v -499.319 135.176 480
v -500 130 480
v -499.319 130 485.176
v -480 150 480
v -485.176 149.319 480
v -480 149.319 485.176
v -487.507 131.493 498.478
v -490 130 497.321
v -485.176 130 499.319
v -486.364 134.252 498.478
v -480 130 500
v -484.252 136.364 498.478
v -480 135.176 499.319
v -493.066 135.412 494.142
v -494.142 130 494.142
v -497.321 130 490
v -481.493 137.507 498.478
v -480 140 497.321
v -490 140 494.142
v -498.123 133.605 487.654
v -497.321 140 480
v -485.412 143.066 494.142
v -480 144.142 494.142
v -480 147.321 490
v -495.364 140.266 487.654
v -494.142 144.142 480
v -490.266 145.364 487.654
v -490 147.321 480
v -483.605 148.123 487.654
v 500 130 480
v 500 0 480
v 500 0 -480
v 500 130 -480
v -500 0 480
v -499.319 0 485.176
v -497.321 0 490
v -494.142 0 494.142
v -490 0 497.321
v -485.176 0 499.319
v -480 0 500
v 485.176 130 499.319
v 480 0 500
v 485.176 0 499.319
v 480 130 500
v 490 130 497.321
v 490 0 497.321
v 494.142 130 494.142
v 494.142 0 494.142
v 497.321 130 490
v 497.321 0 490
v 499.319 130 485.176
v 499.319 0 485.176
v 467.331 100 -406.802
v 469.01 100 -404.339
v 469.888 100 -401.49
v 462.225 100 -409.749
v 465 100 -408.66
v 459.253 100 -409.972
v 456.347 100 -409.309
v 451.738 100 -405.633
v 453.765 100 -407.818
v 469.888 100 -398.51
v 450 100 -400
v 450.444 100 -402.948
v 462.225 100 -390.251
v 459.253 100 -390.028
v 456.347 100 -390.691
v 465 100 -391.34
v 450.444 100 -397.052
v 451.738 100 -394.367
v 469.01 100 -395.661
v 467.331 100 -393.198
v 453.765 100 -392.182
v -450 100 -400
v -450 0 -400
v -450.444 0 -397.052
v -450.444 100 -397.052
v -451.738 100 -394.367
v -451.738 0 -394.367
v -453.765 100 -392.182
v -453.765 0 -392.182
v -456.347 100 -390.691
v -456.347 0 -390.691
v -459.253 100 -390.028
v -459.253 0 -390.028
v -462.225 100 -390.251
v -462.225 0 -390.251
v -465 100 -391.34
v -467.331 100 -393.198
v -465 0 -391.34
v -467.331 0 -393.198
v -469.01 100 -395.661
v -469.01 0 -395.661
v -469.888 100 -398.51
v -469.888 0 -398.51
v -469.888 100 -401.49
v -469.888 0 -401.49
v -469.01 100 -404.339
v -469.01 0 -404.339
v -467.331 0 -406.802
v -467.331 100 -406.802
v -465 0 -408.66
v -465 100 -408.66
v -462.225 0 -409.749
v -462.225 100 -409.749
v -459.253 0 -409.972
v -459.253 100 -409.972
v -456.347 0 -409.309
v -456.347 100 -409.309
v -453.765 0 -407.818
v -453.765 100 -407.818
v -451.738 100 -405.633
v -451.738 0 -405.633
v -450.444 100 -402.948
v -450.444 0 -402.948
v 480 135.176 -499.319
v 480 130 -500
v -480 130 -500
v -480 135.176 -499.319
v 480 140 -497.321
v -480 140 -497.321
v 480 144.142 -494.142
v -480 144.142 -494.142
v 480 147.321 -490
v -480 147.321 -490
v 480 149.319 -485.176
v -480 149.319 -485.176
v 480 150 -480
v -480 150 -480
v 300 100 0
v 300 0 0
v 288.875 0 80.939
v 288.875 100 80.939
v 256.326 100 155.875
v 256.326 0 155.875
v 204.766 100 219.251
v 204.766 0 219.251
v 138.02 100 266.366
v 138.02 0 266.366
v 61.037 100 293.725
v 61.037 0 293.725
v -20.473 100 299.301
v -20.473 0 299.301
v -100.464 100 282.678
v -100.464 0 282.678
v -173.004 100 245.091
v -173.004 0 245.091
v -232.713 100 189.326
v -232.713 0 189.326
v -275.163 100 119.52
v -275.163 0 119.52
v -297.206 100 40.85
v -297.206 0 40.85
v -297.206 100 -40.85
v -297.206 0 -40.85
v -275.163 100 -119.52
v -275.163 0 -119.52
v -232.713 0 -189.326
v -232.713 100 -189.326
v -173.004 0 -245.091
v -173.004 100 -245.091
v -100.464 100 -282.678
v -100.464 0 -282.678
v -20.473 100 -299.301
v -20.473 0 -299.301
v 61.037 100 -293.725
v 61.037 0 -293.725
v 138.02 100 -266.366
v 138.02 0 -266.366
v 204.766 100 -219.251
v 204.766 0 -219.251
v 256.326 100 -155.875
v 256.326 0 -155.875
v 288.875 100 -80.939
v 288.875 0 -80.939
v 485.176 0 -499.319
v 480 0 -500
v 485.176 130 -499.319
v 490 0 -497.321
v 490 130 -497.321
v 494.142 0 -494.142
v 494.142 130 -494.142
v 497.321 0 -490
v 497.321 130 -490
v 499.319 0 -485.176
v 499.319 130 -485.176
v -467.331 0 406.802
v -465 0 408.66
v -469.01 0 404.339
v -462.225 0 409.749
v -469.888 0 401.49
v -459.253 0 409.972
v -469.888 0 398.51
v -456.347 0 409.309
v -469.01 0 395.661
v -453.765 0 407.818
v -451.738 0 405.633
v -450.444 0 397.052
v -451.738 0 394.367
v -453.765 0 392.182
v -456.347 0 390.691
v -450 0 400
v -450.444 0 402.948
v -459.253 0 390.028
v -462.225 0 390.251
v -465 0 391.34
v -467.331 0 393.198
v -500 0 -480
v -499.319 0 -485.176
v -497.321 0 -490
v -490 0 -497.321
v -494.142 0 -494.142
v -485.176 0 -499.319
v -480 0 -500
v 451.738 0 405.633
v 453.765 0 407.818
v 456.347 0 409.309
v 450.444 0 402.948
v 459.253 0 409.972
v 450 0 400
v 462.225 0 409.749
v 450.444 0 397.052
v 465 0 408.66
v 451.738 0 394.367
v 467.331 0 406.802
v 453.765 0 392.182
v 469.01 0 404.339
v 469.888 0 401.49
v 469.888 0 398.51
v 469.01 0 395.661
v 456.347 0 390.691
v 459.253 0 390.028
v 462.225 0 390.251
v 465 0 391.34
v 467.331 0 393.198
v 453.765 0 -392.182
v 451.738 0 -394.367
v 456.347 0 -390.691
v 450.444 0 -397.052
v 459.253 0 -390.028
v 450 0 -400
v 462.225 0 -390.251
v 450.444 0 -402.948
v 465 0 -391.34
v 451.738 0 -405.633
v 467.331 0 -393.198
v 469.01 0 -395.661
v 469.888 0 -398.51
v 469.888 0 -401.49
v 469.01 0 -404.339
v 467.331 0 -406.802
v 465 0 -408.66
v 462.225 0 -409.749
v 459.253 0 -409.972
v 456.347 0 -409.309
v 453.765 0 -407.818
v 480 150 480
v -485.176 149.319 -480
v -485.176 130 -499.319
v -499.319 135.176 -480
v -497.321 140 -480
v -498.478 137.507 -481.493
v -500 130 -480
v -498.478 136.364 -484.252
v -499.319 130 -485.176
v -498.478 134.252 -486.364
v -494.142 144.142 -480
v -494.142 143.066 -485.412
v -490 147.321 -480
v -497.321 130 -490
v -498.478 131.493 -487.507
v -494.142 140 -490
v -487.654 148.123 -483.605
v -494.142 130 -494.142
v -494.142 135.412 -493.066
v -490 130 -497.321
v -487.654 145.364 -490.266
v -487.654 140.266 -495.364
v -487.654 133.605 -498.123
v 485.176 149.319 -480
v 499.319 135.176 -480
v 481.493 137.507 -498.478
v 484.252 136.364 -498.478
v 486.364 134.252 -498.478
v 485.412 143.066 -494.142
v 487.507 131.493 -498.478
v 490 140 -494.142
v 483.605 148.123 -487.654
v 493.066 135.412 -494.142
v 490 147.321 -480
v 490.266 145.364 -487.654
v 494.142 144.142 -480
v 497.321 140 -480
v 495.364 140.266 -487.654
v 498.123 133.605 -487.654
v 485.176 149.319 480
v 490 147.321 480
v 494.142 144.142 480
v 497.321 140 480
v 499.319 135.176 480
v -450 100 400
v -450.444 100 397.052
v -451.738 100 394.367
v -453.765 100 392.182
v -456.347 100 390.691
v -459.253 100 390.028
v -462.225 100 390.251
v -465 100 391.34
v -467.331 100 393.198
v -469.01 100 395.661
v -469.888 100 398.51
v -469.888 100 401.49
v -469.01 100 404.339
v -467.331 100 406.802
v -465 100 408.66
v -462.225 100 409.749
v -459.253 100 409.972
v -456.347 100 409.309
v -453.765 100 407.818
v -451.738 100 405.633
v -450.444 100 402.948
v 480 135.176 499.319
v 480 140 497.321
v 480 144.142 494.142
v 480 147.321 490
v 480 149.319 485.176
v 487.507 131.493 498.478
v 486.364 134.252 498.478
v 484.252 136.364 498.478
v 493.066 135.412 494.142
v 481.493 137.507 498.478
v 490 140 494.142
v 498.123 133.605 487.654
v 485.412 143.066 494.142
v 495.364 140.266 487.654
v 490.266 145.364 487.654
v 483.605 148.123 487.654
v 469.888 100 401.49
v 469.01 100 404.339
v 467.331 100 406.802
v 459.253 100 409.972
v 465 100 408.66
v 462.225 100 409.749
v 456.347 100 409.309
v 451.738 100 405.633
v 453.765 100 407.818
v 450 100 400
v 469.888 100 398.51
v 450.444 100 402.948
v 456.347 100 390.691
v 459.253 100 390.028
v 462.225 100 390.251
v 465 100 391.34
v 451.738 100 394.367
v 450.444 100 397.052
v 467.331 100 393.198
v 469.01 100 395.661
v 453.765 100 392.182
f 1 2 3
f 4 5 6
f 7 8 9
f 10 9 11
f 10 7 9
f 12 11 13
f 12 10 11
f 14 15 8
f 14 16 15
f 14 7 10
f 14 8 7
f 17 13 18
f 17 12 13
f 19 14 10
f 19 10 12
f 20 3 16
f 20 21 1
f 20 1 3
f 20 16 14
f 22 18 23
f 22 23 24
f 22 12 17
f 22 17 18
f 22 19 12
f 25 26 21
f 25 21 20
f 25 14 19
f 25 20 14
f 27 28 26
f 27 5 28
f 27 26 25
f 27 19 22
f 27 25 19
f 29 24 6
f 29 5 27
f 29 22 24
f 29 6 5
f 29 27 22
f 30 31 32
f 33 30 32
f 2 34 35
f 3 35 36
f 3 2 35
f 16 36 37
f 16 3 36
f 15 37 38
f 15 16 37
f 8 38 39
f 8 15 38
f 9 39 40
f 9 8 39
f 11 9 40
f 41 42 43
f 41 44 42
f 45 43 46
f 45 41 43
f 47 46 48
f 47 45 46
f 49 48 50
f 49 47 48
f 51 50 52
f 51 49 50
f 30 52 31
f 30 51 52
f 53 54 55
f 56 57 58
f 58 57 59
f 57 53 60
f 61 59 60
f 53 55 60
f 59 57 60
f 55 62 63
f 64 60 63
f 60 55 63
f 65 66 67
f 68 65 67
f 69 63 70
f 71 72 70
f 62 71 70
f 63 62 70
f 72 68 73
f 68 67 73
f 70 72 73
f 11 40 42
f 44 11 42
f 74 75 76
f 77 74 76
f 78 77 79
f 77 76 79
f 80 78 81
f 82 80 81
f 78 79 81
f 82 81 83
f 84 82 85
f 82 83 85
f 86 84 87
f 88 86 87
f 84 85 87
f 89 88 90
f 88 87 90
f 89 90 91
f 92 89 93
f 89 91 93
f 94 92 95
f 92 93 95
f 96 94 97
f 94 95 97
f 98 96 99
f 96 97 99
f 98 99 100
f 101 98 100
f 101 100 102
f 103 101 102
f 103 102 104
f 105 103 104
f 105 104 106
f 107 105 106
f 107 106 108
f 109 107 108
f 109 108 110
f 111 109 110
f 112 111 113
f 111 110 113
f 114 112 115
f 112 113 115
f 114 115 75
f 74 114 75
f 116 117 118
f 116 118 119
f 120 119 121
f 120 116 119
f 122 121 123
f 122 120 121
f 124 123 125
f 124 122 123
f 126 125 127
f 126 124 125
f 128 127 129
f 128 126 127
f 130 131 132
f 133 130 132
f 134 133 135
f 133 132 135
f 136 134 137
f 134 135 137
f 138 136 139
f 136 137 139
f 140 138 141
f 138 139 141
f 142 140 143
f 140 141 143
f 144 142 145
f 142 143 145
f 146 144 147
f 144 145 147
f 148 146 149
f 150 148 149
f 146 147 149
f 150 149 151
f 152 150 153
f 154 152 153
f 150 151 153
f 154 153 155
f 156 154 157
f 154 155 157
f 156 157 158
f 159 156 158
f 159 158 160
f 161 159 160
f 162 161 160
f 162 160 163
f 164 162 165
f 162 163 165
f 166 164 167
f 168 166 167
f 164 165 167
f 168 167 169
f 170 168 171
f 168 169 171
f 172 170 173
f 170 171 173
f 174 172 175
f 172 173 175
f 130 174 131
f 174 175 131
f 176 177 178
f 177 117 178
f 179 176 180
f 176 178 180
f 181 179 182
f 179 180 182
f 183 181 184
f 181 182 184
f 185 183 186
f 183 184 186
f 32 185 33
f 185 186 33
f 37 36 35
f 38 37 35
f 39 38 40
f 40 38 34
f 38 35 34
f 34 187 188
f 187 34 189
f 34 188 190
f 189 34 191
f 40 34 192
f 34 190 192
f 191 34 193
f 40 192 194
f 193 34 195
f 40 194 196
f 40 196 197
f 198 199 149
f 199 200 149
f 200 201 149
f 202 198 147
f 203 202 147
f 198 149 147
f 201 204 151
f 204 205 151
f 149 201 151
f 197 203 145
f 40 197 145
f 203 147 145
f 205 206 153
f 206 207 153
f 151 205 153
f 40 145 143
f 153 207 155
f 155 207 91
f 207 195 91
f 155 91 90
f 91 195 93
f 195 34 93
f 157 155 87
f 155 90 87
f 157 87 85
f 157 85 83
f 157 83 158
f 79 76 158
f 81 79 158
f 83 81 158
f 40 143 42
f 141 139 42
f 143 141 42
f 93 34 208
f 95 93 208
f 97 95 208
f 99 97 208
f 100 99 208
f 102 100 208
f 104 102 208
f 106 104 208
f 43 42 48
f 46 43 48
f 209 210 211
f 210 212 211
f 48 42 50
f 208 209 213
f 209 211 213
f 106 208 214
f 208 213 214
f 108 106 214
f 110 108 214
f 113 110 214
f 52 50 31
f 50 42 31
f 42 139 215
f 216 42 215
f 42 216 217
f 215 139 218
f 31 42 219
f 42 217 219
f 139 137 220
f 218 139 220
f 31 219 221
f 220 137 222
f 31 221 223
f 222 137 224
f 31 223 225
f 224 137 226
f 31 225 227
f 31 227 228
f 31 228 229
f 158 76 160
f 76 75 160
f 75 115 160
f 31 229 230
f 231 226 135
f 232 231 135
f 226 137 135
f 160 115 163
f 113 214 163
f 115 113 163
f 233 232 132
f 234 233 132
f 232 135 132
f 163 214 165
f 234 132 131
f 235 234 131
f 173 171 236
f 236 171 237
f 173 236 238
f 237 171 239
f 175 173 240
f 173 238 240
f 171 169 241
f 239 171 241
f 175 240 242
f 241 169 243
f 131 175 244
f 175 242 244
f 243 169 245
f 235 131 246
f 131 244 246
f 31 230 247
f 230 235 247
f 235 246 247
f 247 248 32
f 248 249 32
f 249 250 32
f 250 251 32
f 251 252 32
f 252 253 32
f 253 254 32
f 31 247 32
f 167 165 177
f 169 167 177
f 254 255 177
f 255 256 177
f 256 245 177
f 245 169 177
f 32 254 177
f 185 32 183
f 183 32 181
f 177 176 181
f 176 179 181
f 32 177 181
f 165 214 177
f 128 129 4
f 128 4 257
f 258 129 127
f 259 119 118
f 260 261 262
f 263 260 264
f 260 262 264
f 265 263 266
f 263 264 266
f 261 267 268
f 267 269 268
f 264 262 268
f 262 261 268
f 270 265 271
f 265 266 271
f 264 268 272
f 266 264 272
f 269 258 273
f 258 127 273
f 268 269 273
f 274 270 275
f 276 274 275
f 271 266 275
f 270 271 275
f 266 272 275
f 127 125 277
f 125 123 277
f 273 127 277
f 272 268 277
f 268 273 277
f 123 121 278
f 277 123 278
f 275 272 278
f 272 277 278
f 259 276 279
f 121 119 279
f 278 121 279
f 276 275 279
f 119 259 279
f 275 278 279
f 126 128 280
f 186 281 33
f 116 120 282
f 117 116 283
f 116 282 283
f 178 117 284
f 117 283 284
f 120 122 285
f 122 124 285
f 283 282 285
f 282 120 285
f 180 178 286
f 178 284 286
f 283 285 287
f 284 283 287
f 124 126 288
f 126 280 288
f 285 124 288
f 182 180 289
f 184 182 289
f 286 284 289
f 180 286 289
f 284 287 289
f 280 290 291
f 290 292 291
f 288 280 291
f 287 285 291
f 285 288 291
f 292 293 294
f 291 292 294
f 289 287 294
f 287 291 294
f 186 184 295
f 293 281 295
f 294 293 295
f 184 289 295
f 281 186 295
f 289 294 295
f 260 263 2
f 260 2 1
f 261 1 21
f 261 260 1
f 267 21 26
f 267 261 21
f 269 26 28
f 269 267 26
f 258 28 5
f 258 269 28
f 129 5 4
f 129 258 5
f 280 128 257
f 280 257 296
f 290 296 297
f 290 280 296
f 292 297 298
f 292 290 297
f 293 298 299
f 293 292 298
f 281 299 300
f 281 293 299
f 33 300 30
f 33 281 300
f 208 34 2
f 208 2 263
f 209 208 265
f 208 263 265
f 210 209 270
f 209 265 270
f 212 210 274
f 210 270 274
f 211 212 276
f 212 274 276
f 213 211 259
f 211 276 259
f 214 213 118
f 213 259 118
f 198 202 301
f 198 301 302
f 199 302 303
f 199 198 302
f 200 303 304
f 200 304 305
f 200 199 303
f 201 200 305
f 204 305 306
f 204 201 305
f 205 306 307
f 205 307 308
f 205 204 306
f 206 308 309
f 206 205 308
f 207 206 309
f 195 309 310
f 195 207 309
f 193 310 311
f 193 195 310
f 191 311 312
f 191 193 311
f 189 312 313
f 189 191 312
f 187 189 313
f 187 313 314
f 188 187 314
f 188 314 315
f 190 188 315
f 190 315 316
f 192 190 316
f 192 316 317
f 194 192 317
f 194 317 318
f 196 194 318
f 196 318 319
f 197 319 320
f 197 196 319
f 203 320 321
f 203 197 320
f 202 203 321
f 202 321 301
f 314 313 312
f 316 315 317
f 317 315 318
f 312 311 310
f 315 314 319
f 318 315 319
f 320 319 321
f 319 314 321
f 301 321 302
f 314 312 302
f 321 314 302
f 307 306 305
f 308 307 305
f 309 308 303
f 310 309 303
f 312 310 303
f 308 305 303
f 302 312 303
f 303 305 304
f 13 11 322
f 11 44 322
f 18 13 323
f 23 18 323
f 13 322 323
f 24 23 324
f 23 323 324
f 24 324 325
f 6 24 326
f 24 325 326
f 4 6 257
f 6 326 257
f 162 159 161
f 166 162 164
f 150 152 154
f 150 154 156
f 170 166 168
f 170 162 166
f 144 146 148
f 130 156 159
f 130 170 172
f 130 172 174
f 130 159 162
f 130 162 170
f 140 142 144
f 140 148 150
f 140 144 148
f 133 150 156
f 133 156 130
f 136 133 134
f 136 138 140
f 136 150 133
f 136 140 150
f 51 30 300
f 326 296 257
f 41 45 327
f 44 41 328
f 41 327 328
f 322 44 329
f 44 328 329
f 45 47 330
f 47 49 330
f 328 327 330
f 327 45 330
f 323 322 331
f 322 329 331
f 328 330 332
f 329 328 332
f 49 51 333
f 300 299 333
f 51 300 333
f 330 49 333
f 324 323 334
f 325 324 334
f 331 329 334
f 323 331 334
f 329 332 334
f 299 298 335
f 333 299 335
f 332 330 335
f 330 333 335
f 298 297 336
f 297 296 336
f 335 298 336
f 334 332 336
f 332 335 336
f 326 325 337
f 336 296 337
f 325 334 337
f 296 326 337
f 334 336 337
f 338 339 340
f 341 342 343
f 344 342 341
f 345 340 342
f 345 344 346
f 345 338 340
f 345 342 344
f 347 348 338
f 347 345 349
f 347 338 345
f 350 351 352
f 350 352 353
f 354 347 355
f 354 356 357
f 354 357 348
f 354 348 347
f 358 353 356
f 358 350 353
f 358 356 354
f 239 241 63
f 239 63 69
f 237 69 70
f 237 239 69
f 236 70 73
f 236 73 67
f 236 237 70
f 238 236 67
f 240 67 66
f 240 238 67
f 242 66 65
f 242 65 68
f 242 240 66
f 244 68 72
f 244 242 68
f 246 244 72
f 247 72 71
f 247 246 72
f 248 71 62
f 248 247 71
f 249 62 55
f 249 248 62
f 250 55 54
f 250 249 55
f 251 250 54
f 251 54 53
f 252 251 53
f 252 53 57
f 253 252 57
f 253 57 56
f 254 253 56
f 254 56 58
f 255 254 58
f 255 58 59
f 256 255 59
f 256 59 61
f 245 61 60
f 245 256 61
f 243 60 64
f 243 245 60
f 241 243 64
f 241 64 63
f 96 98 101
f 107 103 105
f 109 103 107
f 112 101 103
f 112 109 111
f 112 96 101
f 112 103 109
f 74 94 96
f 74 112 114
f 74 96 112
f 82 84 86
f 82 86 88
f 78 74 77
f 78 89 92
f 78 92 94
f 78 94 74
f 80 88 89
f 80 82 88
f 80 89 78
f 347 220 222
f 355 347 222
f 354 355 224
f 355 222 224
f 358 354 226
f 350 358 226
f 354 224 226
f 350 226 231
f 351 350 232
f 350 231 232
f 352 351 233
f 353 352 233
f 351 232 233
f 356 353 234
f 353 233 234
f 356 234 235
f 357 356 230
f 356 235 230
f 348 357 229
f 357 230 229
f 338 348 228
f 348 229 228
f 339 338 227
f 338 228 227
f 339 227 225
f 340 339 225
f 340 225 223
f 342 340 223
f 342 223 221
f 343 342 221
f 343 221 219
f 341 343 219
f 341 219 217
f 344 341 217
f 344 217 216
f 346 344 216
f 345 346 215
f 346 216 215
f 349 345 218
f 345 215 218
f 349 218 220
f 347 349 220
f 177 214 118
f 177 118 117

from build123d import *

# Parameters (mm, degrees)
SKETCH1_W               = 1000
SKETCH1_H               = 1000
BOSS_EXTRUDE1_DEPTH     = 150
SKETCH2_R               = 300
CUT_EXTRUDE1_DEPTH      = 100
FILLET1_R               = 20
SKETCH3_R               = 10
CUT_EXTRUDE2_DEPTH      = 100
MIRROR2_COPY_1_SKETCH_R = 10
MIRROR2_COPY_1_DEPTH    = 100


with BuildPart() as part:
    # Sketch1 → Boss-Extrude1 (new body)
    with BuildSketch(Plane(origin=(0, 0, 0), x_dir=(1, 0, 0), z_dir=(0, 1, 0))):
        Rectangle(SKETCH1_W, SKETCH1_H)
    extrude(amount=BOSS_EXTRUDE1_DEPTH)

    # Sketch2 → Cut-Extrude1 (cut)
    with BuildSketch(Plane.XZ):
        Circle(SKETCH2_R)
    extrude(amount=-CUT_EXTRUDE1_DEPTH, mode=Mode.SUBTRACT)

    # Fillet1
    fillet1_edges = [part.edges().sort_by_distance(p)[0] for p in [
        (500, 150, 0),
        (0, 150, -500),
        (-500, 150, 0),
        (-500, 75, -500),
        (500, 75, -500),
        (500, 75, 500),
        (-500, 75, 500),
        (0, 150, 500),
    ]]
    fillet(fillet1_edges, radius=FILLET1_R)

    # Sketch3 → Cut-Extrude2 (cut)
    with BuildSketch(Plane.XZ):
        with Locations((-460, -400)):
            Circle(SKETCH3_R)
    cut_extrude2 = extrude(amount=-CUT_EXTRUDE2_DEPTH, mode=Mode.SUBTRACT)

    # Mirror1: Cut-Extrude2 across plane
    add(cut_extrude2.mirror(Plane(origin=(0, 0, 0), x_dir=(0, 0, 1), z_dir=(1, 0, 0))), mode=Mode.SUBTRACT)

    # Mirror2: Cut-Extrude2 across plane
    add(cut_extrude2.mirror(Plane.XY), mode=Mode.SUBTRACT)

    # Mirror2 copy 1 sketch → Mirror2 copy 1 (cut)
    with BuildSketch(Plane(origin=(0, 0, 0), x_dir=(-1, 0, 0), z_dir=(0, -1, 0))):
        with Locations((-460, -400)):
            Circle(MIRROR2_COPY_1_SKETCH_R)
    extrude(amount=-MIRROR2_COPY_1_DEPTH, mode=Mode.SUBTRACT)


solid = part.part
